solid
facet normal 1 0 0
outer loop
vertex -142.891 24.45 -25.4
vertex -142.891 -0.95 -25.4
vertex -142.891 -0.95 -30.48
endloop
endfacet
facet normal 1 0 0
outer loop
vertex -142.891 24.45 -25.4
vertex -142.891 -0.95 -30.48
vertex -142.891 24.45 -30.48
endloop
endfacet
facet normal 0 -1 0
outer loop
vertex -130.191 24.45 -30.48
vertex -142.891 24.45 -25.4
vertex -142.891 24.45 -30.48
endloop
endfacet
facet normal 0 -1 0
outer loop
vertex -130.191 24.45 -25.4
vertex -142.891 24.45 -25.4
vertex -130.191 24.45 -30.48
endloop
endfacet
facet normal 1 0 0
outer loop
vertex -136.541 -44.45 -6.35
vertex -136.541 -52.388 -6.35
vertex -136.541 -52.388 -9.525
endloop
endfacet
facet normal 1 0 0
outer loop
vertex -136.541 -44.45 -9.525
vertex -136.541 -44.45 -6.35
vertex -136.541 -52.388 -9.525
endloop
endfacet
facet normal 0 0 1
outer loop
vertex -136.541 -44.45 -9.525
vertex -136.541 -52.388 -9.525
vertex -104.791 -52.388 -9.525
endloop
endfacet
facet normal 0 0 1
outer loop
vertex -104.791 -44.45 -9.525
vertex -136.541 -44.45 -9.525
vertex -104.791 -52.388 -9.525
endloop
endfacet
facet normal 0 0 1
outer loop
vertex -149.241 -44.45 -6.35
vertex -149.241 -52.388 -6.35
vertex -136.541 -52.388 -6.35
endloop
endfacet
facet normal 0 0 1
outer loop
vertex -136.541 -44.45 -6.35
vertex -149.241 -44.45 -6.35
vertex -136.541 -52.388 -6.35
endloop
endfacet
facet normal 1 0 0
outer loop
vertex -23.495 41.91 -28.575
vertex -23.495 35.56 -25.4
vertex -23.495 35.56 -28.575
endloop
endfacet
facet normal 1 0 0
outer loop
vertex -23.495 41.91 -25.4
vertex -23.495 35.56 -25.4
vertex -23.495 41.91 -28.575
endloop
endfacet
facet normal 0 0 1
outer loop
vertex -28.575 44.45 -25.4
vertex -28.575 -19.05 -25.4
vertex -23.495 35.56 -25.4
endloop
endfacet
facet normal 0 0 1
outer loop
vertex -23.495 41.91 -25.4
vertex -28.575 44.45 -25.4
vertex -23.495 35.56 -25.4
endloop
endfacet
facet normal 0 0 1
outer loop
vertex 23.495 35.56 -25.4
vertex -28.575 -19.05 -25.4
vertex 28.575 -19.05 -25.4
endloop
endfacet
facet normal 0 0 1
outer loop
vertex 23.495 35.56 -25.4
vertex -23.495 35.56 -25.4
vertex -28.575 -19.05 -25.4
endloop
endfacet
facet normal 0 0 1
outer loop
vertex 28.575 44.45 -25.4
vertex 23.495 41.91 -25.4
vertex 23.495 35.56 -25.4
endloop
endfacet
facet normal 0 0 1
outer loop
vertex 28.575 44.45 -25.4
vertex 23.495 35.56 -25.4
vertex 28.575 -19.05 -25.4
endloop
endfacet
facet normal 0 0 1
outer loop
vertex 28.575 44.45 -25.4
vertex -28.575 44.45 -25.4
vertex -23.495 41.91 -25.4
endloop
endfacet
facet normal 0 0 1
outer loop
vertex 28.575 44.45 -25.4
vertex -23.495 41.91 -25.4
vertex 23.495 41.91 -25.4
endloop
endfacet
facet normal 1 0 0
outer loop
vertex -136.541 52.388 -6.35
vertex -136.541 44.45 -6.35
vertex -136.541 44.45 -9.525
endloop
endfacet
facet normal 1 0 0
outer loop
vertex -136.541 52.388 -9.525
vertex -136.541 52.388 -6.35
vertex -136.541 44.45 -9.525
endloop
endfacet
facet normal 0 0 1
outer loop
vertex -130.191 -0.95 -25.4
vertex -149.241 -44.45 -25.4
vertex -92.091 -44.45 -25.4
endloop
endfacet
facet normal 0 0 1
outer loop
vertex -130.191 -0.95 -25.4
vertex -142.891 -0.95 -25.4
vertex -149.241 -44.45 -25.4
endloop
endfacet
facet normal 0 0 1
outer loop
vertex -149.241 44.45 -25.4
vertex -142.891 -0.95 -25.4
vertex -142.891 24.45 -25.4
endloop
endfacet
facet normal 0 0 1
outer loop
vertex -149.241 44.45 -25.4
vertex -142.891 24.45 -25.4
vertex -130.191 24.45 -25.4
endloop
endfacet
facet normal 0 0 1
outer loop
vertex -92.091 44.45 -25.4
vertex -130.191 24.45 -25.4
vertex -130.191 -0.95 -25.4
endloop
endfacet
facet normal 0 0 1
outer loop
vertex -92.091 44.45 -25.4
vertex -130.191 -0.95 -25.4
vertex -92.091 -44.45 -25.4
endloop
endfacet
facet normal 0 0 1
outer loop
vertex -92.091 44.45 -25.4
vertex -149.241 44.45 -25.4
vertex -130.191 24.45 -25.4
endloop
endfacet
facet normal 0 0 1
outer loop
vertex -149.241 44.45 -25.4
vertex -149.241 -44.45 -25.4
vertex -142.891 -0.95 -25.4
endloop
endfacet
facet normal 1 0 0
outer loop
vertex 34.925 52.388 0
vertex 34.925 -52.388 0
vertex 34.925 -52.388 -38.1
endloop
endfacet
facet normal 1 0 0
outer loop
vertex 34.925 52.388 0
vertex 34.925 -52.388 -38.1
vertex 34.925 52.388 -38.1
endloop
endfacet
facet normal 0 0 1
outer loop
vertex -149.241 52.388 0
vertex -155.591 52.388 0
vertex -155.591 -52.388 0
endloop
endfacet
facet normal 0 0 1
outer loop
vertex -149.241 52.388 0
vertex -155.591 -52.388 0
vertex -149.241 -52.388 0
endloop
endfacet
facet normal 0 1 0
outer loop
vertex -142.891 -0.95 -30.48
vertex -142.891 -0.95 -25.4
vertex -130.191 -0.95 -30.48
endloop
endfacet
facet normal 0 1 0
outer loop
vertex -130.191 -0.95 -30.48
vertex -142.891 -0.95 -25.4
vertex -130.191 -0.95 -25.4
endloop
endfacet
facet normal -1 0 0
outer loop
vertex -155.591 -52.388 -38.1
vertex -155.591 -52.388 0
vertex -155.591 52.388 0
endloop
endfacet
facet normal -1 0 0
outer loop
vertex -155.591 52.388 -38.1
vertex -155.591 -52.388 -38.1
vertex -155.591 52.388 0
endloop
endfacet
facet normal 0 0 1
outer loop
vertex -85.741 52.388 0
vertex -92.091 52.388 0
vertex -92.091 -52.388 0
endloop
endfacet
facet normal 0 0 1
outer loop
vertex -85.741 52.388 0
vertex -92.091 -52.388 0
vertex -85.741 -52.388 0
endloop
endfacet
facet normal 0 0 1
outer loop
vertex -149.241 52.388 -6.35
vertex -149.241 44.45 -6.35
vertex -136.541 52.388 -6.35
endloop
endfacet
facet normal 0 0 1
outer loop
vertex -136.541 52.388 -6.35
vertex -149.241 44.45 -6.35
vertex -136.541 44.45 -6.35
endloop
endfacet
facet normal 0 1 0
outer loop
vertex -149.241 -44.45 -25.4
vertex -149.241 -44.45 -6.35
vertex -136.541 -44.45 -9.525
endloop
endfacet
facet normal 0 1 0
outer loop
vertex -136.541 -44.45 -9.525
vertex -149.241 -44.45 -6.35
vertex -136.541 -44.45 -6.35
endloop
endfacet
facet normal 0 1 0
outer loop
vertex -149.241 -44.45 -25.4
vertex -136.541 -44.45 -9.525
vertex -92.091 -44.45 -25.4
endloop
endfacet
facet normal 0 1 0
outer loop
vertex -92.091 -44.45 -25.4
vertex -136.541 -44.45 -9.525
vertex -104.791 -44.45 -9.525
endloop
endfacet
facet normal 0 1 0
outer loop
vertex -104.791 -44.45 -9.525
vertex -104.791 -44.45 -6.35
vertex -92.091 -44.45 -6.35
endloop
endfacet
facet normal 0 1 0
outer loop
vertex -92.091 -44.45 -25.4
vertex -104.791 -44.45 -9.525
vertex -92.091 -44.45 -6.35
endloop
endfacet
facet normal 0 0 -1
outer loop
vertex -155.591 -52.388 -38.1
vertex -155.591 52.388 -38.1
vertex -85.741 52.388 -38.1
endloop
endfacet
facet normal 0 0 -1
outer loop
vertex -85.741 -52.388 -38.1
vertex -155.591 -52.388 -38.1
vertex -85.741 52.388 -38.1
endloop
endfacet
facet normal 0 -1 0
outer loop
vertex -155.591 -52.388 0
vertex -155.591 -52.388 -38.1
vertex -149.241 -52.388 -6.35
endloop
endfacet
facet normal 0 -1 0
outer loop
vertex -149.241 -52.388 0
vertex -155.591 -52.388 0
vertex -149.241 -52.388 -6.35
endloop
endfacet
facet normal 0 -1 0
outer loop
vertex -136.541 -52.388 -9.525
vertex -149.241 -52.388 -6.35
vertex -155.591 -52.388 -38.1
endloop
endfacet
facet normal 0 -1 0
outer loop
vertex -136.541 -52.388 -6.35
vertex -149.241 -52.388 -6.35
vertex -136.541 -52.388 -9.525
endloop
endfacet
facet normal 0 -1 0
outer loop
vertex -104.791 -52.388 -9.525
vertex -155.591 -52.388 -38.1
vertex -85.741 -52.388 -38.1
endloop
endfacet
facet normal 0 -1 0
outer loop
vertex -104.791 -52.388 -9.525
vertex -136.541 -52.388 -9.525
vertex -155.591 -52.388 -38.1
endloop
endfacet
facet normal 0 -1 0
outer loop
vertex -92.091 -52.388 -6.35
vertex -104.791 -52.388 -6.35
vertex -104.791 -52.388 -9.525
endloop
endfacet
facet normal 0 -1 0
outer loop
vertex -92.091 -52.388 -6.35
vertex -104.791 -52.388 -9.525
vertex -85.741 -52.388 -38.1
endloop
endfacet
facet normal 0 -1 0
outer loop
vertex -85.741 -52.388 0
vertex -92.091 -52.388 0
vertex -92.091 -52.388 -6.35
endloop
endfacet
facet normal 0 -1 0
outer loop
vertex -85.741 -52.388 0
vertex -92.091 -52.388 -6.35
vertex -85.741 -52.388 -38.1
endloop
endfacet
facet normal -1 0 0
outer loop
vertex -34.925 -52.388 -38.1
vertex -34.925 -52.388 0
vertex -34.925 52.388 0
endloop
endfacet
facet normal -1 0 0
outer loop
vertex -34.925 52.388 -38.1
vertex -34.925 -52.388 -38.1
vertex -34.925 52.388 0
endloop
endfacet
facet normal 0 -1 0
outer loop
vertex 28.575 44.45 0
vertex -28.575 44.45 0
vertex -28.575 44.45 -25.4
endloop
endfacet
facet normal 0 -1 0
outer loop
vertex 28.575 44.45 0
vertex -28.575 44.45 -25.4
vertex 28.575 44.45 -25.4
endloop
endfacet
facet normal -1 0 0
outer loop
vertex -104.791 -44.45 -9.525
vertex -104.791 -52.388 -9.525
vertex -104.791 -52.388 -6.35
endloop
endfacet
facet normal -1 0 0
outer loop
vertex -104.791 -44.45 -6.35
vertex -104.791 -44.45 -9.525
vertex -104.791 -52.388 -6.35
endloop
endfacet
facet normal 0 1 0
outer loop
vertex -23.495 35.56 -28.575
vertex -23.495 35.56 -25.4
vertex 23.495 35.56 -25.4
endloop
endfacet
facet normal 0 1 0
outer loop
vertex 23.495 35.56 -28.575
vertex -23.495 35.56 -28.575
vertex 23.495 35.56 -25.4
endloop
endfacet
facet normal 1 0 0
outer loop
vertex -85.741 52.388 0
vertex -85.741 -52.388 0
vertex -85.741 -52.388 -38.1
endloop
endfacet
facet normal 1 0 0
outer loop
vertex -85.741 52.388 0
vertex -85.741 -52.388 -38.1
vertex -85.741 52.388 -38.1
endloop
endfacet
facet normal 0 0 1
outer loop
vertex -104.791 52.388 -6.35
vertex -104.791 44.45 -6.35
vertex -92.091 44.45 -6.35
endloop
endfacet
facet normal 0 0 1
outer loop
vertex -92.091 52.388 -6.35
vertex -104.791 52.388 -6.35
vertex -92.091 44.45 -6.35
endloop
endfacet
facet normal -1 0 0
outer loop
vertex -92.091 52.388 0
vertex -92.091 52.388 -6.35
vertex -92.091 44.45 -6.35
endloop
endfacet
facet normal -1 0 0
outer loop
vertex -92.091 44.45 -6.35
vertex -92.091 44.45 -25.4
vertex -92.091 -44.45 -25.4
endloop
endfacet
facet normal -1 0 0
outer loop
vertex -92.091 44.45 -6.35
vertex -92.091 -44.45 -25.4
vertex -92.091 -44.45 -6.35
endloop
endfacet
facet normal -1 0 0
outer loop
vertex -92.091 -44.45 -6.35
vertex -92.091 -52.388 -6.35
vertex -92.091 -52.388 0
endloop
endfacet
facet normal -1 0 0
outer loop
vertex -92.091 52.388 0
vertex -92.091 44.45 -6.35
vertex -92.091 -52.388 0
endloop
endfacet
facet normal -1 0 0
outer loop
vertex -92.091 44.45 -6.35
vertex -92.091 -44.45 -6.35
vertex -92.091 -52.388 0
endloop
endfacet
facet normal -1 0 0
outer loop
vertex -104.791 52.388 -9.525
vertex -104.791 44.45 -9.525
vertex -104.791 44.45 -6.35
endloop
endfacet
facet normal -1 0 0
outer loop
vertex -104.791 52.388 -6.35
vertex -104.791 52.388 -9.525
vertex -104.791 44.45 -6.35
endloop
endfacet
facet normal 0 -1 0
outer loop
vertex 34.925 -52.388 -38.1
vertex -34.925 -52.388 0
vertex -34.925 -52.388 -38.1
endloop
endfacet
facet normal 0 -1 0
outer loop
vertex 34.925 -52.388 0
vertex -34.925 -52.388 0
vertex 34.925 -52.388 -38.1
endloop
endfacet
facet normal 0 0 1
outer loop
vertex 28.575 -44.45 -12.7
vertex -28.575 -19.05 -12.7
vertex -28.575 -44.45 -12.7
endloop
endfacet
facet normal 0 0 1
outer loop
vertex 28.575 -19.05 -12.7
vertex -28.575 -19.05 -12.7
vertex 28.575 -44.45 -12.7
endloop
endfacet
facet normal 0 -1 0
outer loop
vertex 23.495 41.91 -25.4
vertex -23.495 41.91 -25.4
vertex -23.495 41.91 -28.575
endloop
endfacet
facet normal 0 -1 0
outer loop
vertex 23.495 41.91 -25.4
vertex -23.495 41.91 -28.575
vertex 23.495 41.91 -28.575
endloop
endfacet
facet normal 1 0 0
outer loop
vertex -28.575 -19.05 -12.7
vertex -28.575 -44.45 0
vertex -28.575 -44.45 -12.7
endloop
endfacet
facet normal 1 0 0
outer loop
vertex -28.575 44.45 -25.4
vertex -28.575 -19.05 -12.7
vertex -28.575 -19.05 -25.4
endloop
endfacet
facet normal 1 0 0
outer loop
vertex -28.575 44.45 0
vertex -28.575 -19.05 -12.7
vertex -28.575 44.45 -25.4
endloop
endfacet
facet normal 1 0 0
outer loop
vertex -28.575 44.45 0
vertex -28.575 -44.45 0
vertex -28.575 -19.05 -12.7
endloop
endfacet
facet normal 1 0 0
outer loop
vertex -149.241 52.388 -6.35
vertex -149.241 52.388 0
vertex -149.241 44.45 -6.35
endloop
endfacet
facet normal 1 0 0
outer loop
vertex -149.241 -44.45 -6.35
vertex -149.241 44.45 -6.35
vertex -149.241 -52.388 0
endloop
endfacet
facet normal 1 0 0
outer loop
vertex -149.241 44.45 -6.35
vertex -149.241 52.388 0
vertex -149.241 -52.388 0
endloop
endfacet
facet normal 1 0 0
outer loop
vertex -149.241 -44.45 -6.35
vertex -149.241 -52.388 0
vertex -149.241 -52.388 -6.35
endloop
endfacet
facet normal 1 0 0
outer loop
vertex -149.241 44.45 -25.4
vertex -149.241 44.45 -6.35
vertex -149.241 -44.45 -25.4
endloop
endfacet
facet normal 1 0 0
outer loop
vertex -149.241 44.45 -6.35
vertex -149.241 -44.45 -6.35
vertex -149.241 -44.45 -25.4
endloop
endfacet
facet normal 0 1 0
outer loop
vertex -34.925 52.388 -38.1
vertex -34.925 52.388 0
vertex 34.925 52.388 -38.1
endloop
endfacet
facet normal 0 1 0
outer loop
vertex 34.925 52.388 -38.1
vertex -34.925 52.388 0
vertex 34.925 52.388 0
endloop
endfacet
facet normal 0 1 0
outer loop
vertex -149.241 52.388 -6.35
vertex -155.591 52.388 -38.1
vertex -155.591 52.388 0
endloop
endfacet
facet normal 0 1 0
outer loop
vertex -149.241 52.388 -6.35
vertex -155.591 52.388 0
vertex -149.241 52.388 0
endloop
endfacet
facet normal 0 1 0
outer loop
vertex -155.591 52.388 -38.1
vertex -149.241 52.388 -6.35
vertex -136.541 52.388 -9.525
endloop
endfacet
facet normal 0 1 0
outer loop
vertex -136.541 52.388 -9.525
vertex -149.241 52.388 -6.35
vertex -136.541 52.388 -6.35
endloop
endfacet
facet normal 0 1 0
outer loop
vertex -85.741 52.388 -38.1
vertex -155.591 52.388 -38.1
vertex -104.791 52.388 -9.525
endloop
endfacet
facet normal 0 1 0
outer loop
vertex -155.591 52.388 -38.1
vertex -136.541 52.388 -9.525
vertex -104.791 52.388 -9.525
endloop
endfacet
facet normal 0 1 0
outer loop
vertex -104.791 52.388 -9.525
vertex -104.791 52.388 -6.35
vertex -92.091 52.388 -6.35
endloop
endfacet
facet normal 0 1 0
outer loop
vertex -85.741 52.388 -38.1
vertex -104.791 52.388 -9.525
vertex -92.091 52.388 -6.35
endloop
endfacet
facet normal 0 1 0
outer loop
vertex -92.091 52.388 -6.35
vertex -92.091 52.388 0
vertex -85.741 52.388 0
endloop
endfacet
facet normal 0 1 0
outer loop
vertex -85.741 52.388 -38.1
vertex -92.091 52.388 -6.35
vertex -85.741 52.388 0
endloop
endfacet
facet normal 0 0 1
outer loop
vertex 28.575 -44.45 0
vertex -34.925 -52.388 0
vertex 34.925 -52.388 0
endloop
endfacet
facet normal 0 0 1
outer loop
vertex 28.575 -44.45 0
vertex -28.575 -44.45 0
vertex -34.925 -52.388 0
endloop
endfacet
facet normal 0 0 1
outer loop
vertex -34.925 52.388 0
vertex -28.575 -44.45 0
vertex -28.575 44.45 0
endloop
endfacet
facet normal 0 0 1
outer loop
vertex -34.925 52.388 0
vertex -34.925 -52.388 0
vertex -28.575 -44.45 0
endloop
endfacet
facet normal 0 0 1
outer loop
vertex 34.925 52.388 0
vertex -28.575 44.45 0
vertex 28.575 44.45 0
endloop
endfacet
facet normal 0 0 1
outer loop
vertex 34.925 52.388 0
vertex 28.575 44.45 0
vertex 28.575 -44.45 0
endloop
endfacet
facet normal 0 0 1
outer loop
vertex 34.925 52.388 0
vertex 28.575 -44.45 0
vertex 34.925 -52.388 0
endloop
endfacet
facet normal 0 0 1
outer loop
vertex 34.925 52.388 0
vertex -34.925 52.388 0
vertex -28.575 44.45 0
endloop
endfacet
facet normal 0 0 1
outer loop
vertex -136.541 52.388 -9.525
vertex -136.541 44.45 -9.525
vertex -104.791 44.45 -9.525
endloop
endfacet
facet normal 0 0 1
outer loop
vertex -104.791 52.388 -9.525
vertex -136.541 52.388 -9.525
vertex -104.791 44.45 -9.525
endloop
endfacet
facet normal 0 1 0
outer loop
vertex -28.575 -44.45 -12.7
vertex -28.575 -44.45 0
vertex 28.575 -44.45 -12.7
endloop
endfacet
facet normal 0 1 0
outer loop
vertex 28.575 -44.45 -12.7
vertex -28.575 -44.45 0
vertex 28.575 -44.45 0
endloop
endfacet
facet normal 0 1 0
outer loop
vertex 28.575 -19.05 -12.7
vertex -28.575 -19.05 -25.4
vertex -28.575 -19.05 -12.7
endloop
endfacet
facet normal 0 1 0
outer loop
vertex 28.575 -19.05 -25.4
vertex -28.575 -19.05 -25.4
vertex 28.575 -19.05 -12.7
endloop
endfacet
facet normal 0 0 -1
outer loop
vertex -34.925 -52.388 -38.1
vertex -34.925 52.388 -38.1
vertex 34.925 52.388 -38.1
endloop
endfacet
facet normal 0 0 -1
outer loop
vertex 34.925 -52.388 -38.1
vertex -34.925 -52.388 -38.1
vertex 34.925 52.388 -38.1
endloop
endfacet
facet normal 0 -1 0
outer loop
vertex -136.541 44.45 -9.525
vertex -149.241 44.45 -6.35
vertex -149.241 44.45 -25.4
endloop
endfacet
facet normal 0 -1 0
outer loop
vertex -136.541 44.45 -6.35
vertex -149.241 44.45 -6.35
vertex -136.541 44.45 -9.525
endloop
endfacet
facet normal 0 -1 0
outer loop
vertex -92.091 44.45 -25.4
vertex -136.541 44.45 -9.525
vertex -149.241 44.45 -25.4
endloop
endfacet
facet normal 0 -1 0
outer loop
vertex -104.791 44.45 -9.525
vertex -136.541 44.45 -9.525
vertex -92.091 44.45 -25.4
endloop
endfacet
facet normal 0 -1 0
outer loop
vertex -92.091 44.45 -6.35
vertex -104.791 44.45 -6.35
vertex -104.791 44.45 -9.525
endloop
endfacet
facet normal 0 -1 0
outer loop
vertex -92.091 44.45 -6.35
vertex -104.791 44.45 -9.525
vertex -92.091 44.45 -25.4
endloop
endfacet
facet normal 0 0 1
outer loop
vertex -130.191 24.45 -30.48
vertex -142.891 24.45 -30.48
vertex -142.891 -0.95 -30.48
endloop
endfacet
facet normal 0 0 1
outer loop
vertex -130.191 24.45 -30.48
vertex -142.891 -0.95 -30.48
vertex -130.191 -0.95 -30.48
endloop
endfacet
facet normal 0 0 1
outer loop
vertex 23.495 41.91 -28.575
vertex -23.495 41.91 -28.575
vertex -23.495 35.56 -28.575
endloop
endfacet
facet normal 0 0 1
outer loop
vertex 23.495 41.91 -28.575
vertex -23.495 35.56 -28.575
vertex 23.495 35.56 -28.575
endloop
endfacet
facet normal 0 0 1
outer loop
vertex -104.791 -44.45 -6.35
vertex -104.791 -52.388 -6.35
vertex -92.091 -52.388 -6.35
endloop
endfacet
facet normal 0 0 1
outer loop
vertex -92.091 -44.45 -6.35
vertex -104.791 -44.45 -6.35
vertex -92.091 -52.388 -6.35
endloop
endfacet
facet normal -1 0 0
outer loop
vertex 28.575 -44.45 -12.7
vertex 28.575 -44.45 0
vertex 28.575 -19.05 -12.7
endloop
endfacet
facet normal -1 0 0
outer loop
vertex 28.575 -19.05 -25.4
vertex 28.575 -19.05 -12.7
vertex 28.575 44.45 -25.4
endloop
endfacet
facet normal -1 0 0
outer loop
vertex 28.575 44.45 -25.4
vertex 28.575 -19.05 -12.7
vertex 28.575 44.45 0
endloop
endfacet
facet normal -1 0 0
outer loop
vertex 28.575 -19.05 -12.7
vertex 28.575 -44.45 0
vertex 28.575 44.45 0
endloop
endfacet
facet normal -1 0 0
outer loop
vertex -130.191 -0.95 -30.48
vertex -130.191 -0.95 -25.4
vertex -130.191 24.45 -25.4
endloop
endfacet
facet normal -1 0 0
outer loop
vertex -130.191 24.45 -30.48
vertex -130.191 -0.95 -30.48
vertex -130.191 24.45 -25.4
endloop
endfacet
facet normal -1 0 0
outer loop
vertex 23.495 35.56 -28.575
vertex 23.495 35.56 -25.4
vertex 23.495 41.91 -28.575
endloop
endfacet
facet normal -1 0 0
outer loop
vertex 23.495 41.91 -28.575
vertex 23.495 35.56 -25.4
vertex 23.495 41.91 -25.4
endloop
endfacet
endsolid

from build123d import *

# Parameters (mm, degrees)
F0_W      = 69.85
F0_H      = 104.775
F1_DEPTH  = 38.1
F2_W      = 57.15
F2_H      = 88.9
F3_DEPTH  = 25.4
F4_W      = 57.15
F4_H      = 25.4
F5_DEPTH  = 12.7
F6_DEPTH  = 25.4
F8_DEPTH  = 104.776
F9_W      = 12.7
F9_H      = 25.4
F10_DEPTH = 5.08
F11_W     = 46.99
F11_H     = 6.35
F12_DEPTH = 3.175


with BuildPart() as f1:
    # F0 (on Top) → F1 (new body)
    with BuildSketch(Plane.XY):
        Rectangle(F0_W, F0_H)
    extrude(amount=-F1_DEPTH)

    # F2 (on Top) → F3 (cut)
    with BuildSketch(Plane.XY):
        Rectangle(F2_W, F2_H)
    extrude(amount=-F3_DEPTH, mode=Mode.SUBTRACT)

    # F4 (on face) → F5 (join)
    with BuildSketch(Plane.XY.offset(-25.4)):
        with Locations((0, -31.75)):
            Rectangle(F4_W, F4_H)
    extrude(amount=F5_DEPTH)

    # F11 (on face) → F12 (cut)
    with BuildSketch(Plane.XY.offset(-25.4)):
        with Locations((0, 38.735)):
            Rectangle(F11_W, F11_H)
    extrude(amount=-F12_DEPTH, mode=Mode.SUBTRACT)


with BuildPart() as f1b:
    # F0 (on Top) → F1, piece 2 (new body)
    with BuildSketch(Plane.XY):
        with Locations((-120.6659083736, 0)):
            Rectangle(F0_W, F0_H)
    extrude(amount=-F1_DEPTH)

    # F2 (on Top) → F6 (cut)
    with BuildSketch(Plane.XY):
        Rectangle(F2_W, F2_H)
        with Locations((-120.6659083736, 0)):
            Rectangle(F2_W, F2_H)
    extrude(amount=-F6_DEPTH, mode=Mode.SUBTRACT)

    # F7 (on face) → F8 (cut, through all)
    with BuildSketch(Plane.XZ.offset(52.3875)):
        Polygon((-92.0909083736, 0), (-149.2409083736, 0), (-149.2409083736, -6.35), (-136.5409083736, -6.35), (-136.5409083736, -9.525), (-104.7909083736, -9.525), (-104.7909083736, -6.35), (-92.0909083736, -6.35), align=None)
    extrude(amount=-F8_DEPTH, mode=Mode.SUBTRACT)

    # F9 (on face) → F10 (cut)
    with BuildSketch(Plane.XY.offset(-25.4)):
        with Locations((-136.5409083736, 11.75)):
            Rectangle(F9_W, F9_H)
    extrude(amount=-F10_DEPTH, mode=Mode.SUBTRACT)


solid = Compound([f1.part, f1b.part])
